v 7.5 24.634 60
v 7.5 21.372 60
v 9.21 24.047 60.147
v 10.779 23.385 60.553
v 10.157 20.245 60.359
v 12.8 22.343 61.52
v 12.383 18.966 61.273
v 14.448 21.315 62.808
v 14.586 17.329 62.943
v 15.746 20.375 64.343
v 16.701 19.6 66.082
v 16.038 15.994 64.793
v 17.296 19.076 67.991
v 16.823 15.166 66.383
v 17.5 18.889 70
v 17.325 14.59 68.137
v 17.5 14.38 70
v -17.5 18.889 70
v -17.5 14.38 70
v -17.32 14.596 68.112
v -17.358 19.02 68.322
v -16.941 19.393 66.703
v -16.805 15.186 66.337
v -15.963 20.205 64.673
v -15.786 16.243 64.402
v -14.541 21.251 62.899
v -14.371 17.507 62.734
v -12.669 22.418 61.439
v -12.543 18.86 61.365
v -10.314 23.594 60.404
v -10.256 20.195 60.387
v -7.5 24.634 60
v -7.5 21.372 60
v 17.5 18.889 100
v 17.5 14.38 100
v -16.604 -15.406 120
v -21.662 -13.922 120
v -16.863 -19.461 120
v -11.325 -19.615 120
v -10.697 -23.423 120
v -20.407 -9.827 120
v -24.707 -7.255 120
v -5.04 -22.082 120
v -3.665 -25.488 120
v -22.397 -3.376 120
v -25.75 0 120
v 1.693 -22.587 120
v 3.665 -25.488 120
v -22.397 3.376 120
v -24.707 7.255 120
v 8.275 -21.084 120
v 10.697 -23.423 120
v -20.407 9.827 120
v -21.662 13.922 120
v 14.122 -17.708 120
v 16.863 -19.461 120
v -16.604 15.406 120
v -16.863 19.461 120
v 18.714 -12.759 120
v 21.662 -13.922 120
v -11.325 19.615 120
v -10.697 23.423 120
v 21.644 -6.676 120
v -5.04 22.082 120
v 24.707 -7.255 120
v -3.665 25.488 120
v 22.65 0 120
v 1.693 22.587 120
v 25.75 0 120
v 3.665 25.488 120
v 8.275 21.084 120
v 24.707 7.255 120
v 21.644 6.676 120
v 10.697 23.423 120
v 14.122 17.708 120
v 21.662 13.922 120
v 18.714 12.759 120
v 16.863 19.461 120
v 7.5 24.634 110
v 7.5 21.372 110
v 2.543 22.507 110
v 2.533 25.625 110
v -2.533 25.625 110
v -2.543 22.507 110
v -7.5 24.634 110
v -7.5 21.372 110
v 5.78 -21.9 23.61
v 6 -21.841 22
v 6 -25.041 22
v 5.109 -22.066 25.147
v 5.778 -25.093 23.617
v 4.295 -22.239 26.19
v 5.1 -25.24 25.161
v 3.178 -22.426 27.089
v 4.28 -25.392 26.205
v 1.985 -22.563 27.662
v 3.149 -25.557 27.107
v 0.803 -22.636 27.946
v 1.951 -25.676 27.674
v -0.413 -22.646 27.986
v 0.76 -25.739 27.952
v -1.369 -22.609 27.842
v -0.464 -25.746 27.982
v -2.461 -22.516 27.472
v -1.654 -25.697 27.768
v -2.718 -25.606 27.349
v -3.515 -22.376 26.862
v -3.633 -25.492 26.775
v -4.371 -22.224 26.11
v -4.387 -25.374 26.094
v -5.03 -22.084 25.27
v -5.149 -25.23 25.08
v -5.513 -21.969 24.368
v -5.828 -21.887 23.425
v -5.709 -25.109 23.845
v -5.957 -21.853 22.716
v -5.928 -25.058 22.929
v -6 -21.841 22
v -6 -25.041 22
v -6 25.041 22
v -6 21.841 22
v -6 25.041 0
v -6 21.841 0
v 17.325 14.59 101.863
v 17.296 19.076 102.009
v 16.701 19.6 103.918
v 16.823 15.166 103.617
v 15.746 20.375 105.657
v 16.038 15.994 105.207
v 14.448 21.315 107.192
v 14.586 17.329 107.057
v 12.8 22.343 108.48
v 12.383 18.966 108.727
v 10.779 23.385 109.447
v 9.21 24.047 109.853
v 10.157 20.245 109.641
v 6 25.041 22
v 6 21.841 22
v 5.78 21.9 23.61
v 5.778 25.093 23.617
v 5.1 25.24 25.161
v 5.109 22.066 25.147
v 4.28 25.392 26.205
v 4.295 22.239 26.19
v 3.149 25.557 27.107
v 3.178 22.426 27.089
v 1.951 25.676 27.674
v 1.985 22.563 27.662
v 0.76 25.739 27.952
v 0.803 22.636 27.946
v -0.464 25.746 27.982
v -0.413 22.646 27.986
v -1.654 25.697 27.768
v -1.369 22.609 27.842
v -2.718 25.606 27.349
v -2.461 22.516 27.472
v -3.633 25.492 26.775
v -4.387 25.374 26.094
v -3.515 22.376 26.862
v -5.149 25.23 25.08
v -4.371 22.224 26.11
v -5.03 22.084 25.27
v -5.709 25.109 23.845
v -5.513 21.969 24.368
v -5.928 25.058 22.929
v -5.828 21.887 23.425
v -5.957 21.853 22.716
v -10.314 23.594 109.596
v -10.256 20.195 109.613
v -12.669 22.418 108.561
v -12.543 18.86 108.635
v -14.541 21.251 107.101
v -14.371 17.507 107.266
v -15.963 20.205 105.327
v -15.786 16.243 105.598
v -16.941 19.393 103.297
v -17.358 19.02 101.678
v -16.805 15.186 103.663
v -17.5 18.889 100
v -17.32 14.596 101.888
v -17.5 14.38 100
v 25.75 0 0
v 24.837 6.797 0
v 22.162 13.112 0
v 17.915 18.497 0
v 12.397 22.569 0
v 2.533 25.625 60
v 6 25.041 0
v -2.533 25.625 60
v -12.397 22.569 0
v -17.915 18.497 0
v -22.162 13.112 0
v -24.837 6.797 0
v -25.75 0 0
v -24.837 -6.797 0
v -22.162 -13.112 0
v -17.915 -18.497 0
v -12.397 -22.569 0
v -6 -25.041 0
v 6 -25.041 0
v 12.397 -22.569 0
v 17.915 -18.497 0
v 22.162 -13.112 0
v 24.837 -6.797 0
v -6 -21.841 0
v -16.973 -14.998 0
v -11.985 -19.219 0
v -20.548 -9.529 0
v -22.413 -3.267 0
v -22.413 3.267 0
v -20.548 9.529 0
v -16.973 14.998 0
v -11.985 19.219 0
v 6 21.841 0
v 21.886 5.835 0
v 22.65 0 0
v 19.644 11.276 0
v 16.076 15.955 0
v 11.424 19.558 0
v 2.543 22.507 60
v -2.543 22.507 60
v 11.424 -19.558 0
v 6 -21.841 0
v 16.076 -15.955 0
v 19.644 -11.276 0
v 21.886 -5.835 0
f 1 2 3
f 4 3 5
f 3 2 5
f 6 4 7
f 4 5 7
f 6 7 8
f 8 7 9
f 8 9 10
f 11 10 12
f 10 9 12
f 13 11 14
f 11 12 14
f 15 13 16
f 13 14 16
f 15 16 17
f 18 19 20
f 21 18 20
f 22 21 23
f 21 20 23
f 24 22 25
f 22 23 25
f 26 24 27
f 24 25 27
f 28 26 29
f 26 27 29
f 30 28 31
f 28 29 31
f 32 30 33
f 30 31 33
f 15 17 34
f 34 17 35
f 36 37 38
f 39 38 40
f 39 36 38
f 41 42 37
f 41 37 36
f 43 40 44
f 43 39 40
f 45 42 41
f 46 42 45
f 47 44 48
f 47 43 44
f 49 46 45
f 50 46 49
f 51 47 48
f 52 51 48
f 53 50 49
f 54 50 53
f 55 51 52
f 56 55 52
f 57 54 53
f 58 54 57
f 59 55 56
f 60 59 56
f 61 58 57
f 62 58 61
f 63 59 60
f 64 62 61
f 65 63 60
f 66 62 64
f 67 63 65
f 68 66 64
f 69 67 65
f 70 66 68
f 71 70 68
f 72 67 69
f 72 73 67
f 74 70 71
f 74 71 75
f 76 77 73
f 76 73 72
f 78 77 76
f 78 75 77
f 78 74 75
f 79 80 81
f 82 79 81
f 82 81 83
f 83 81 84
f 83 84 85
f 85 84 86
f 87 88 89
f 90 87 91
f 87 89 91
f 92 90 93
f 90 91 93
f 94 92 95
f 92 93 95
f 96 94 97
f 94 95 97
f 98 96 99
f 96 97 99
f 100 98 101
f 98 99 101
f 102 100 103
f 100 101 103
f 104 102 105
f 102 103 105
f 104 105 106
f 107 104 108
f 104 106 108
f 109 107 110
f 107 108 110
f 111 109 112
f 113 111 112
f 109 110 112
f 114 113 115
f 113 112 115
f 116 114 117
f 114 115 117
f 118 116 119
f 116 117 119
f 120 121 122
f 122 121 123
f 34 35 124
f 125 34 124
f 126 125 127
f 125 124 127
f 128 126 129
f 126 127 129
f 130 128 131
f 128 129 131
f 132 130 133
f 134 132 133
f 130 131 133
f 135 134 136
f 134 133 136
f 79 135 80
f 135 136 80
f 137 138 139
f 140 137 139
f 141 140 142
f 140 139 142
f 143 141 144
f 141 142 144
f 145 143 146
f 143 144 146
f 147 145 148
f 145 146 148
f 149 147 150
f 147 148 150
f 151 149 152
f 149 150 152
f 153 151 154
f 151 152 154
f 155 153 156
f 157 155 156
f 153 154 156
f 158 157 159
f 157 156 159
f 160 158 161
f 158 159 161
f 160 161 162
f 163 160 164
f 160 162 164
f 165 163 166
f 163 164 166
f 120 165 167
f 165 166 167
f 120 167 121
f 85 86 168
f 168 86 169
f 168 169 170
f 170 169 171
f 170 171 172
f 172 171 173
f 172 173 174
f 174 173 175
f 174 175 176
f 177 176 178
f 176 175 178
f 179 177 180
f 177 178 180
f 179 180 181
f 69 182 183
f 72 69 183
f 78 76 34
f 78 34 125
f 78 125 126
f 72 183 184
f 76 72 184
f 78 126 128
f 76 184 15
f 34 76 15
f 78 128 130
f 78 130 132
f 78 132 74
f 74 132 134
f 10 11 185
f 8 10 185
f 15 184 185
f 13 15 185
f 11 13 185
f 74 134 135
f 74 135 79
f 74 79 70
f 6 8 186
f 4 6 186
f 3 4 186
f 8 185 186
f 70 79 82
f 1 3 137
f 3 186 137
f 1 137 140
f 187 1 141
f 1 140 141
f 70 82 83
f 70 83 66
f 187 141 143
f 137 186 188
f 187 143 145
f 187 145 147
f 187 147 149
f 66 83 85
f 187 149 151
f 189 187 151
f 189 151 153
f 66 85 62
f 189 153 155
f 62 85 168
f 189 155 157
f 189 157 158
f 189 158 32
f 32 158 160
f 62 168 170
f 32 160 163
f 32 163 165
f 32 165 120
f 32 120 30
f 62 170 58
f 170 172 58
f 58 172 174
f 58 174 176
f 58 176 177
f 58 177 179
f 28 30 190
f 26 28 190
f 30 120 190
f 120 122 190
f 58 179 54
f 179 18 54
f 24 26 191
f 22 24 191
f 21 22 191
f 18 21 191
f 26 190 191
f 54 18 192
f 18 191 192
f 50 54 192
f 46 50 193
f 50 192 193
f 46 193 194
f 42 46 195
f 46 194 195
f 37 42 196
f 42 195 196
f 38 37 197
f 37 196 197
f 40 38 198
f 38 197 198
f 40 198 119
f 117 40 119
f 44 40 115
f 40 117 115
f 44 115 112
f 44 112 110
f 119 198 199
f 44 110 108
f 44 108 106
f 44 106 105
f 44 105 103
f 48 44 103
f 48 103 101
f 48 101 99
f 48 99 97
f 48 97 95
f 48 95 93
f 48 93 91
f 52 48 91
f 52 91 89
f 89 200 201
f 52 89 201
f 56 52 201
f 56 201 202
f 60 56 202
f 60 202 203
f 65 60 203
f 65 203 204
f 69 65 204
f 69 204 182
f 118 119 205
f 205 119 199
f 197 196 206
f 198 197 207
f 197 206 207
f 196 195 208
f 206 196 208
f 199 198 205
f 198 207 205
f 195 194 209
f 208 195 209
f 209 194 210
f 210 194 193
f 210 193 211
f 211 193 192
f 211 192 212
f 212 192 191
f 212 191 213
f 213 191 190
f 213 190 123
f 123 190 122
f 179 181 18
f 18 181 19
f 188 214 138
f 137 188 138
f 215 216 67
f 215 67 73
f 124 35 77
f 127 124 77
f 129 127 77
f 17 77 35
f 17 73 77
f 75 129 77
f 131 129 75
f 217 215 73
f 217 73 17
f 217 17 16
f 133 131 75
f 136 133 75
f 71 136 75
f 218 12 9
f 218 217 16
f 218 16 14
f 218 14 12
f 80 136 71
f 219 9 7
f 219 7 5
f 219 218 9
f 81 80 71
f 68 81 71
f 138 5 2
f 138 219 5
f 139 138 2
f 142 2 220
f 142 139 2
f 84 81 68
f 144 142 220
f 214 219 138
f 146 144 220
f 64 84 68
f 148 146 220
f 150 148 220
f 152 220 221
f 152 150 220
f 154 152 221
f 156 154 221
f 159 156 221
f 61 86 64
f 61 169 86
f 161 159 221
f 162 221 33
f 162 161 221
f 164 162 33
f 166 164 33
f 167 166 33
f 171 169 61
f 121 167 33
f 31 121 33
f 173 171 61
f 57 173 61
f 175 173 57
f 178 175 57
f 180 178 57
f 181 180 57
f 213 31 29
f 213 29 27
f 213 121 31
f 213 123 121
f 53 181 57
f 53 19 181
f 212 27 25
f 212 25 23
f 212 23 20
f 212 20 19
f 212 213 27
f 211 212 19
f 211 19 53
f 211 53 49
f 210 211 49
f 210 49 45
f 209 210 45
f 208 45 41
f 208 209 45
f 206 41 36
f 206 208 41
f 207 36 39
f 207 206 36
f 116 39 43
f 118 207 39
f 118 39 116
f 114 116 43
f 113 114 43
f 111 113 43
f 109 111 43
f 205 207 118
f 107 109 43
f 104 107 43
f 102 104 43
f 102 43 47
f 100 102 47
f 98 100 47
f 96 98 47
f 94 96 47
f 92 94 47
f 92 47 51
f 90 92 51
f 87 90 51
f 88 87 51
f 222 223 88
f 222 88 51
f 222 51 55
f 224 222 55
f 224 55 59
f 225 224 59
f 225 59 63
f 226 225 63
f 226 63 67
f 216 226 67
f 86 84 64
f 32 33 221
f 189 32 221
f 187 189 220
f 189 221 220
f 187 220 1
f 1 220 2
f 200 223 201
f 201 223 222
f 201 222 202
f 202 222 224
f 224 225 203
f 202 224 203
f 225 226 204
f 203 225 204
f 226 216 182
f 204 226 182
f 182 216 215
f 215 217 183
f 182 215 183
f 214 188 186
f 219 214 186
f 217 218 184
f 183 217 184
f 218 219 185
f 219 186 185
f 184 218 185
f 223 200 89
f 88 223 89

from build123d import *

# Parameters (mm, degrees)
F0_R     = 25.75
F0_R_2   = 22.65
F1_DEPTH = 120
F3_DEPTH = 25.751
F4_DEPTH = 30


with BuildPart() as f1:
    # F0 (on Top) → F1 (new body)
    with BuildSketch(Plane.XY):
        Circle(F0_R)
        Circle(F0_R_2, mode=Mode.SUBTRACT)
    extrude(amount=F1_DEPTH)

    # F2 (on Front) → F3 (cut, through all)
    with BuildSketch(Plane.XZ):
        with BuildLine():
            Line((7.5, 110), (-7.5, 110))
            ThreePointArc((-7.5, 110), (-14.571068, 107.071068), (-17.5, 100))
            Line((-17.5, 100), (-17.5, 70))
            ThreePointArc((-17.5, 70), (-14.571068, 62.928932), (-7.5, 60))
            Line((-7.5, 60), (7.5, 60))
            ThreePointArc((7.5, 60), (14.571068, 62.928932), (17.5, 70))
            Line((17.5, 70), (17.5, 100))
            ThreePointArc((17.5, 100), (14.571068, 107.071068), (7.5, 110))
        make_face()
    extrude(amount=-F3_DEPTH, mode=Mode.SUBTRACT)

    # F2 (on Front) → F4 (cut, symmetric)
    with BuildSketch(Plane.XZ):
        with BuildLine():
            Line((-6, 22), (-6, 0))
            Line((-6, 0), (6, 0))
            Line((6, 0), (6, 22))
            ThreePointArc((6, 22), (0, 28), (-6, 22))
        make_face()
    extrude(amount=F4_DEPTH, both=True, mode=Mode.SUBTRACT)


solid = f1.part
